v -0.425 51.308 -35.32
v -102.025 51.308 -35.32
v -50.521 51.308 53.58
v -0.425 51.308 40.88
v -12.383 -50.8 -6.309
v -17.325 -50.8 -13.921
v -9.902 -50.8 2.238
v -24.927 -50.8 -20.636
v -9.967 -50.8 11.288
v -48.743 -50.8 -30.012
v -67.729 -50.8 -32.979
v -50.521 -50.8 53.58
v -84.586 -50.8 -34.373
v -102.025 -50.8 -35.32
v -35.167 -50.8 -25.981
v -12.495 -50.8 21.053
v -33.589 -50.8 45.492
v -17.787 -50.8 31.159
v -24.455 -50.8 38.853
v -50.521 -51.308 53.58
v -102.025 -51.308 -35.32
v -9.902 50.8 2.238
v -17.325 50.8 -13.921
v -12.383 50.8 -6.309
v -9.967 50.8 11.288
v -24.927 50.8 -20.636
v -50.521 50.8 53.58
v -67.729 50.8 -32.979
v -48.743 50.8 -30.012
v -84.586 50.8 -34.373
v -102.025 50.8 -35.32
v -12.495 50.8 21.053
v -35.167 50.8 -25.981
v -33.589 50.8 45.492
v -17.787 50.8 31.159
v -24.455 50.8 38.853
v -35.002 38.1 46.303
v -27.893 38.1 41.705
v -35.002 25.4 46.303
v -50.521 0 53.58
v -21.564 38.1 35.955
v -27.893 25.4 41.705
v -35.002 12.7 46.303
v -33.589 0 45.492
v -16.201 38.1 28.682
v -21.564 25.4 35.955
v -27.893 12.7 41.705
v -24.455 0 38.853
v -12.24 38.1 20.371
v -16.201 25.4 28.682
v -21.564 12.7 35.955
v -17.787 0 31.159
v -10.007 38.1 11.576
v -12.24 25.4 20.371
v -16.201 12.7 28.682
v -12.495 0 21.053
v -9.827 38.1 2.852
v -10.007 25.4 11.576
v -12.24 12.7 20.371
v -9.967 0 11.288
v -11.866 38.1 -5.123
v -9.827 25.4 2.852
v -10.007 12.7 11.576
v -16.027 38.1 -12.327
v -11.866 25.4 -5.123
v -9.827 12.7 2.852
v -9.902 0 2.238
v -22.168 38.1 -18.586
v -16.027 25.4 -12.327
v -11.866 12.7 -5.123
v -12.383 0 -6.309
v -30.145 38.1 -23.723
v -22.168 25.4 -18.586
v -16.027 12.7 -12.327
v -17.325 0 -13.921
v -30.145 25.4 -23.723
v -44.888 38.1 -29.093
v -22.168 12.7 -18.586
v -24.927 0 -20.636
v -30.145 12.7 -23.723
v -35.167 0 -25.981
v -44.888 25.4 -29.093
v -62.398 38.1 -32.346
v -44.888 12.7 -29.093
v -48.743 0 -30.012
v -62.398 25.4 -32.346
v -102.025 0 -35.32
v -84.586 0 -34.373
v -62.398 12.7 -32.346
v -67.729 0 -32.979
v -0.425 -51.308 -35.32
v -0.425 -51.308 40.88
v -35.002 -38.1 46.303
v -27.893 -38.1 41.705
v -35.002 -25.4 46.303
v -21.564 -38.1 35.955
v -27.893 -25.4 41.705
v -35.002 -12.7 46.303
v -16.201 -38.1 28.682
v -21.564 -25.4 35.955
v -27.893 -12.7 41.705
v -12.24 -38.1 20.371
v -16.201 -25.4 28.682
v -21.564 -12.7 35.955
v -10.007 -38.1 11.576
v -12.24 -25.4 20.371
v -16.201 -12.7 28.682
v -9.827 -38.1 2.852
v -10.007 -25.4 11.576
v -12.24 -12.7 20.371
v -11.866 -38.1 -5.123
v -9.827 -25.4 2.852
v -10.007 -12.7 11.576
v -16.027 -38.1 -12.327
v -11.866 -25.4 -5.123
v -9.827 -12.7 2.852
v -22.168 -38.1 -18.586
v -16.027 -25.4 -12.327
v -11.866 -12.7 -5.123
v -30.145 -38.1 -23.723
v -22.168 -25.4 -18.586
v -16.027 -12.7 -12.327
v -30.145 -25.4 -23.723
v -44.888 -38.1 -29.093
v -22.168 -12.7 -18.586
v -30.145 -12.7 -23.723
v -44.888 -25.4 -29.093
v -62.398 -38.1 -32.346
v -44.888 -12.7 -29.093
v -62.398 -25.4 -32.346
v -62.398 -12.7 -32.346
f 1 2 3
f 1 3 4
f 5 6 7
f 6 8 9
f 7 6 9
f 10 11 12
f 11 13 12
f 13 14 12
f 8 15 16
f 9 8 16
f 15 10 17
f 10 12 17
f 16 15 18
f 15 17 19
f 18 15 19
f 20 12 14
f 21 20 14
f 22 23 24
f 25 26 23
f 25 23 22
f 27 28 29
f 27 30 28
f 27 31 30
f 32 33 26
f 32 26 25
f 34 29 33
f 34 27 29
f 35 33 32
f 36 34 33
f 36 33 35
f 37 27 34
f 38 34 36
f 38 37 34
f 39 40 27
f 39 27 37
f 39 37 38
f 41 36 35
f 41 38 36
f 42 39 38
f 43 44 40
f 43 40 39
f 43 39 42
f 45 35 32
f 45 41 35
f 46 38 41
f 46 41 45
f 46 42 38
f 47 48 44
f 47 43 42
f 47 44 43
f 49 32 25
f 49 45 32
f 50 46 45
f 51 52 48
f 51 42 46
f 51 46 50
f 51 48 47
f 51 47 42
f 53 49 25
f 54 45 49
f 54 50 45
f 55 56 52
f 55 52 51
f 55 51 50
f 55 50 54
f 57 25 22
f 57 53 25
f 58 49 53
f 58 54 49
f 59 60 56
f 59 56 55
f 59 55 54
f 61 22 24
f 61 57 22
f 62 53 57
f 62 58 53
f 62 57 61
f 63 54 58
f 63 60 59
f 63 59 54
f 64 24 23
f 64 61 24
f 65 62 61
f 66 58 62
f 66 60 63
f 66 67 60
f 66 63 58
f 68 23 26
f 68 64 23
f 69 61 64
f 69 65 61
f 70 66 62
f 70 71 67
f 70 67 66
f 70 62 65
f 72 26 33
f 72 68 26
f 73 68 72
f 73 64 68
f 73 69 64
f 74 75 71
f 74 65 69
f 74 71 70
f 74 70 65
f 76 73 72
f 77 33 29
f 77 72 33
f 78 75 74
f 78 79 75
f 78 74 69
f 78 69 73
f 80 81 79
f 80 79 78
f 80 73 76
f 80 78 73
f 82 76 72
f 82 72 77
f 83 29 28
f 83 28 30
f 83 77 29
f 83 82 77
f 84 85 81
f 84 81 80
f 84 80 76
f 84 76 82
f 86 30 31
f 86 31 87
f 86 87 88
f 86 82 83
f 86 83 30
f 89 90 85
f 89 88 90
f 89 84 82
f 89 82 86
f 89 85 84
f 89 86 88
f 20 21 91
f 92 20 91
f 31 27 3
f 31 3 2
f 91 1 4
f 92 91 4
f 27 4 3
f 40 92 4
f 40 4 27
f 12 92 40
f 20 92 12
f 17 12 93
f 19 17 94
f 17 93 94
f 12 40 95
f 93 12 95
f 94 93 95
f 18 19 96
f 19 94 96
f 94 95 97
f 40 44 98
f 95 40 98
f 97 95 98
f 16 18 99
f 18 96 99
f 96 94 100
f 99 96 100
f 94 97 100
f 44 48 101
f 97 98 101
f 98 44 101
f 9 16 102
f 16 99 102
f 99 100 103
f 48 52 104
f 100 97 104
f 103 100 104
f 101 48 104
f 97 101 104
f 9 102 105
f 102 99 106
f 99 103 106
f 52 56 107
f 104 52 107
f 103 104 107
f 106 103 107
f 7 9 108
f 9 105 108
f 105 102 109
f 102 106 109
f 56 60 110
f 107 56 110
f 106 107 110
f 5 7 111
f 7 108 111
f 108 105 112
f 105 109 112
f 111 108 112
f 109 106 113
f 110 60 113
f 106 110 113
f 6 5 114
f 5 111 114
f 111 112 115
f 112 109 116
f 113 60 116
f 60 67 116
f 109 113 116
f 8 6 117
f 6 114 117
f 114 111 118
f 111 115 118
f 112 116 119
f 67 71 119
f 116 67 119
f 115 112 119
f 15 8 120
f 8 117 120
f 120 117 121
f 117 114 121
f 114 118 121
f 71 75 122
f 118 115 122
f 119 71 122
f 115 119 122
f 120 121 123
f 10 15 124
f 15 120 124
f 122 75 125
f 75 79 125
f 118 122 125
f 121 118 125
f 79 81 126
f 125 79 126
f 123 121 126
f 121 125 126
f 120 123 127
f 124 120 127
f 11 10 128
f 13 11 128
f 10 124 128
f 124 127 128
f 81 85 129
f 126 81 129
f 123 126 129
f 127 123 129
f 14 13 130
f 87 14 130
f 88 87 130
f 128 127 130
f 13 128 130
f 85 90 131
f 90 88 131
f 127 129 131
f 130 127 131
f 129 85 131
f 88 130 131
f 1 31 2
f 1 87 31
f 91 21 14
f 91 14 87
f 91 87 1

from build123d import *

# Parameters (mm, degrees)
F1_DEPTH = 50.8
F3_DEPTH = 0.508


with BuildPart() as f1:
    # F0 (on Front) → F1 (new body)
    with BuildSketch(Plane.XZ):
        with BuildLine():
            Line((-102.0248893347, -35.3197461325), (-0.4248893347, -35.3197461325))
            Line((-0.4248893347, -35.3197461325), (-0.4248893347, 40.8802538675))
            Line((-0.4248893347, 40.8802538675), (-50.520752065, 53.5802538675))
            add(Edge.make_bspline(
                [(-50.520752065, 53.5802538675), (-39.943752681, 49.0703022182), (-18.6005809549, 39.9697370167), (-3.6092402382, 1.501755601), (-29.0871667847, -31.6910251415), (-74.7872181103, -33.964646112), (-102.0248893347, -35.3197461325)],
                knots=[0, 0, 0, 0, 0.2233728272, 0.4507407477, 0.6726361897, 1, 1, 1, 1], degree=3))
        make_face()
    extrude(amount=F1_DEPTH)

    # F2 (on face) → F3 (join)
    with BuildSketch(Plane.XZ.offset(50.8)):
        Polygon((-0.4248893347, 40.8802538675), (-50.520752065, 53.5802538675), (-102.0248893347, -35.3197461325), (-0.4248893347, -35.3197461325), align=None)
    extrude(amount=F3_DEPTH)

    # F4: F1 across plane


with BuildPart() as f1_1:
    add(f1.part)
    add(f1.part.mirror(Plane.XZ))


solid = f1_1.part
